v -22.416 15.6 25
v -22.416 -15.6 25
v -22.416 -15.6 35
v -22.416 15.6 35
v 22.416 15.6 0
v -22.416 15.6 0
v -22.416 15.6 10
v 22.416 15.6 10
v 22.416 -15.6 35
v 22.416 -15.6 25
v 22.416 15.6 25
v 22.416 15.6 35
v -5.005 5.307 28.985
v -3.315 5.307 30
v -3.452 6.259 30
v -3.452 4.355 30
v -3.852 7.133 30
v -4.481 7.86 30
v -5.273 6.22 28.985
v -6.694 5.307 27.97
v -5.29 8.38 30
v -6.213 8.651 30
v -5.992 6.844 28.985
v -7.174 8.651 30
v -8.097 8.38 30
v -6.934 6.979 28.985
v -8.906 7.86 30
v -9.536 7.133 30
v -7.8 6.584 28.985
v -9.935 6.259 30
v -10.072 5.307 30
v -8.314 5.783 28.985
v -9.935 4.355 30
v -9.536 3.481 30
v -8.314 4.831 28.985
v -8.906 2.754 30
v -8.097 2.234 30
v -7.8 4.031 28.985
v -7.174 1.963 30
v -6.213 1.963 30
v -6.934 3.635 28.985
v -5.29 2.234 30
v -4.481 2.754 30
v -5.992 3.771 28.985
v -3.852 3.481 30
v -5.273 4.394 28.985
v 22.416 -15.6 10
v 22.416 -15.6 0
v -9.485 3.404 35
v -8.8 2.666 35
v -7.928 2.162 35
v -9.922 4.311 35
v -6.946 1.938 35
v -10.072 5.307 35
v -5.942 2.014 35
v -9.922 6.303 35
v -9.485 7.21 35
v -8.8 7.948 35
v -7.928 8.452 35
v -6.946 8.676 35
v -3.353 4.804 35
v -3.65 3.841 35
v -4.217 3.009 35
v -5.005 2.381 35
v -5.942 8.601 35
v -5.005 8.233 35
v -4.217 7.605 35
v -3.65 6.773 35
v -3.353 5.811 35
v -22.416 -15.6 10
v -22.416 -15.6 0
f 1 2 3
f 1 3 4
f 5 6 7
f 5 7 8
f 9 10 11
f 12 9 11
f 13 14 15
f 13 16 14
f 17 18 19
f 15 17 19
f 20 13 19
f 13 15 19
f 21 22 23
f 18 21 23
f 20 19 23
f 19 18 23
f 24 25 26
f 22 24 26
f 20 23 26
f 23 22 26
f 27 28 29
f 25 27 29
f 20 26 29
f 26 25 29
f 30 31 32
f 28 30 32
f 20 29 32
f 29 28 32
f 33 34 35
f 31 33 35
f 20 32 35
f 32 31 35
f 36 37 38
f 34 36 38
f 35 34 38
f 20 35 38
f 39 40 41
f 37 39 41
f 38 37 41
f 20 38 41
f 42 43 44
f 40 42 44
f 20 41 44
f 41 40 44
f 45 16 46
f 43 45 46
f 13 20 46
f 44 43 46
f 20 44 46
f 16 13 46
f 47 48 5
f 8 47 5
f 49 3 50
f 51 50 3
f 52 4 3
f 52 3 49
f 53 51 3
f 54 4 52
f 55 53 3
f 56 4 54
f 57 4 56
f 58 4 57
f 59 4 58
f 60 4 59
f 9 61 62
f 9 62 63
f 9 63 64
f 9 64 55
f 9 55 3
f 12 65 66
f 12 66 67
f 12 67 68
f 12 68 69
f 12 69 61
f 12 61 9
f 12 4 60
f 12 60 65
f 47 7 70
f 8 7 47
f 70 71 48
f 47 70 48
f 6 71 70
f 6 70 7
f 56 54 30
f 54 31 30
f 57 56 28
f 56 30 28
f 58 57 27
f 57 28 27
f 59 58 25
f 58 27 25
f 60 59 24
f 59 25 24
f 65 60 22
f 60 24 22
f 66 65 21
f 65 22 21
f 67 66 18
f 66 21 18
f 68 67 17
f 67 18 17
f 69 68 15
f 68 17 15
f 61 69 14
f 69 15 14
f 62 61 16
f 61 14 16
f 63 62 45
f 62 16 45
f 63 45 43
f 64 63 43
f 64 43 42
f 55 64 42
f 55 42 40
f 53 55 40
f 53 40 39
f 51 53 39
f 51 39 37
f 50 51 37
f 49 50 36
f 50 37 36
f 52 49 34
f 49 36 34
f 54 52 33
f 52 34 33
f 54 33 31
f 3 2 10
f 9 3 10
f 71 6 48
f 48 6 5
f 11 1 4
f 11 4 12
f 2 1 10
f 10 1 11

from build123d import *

# Parameters (mm, degrees)
F0_W     = 44.8315404356
F0_H     = 31.1993751675
F1_DEPTH = 10
F3_W     = 44.8315404356
F3_H     = 31.1993751675
F4_DEPTH = 10
F6_D     = 6.7564
F6_DEPTH = 5
F6_TIP   = 2.0298273432


with BuildPart() as f1:
    # F0 (on Top) → F1 (new body)
    with BuildSketch(Plane.XY):
        Rectangle(F0_W, F0_H)
    extrude(amount=F1_DEPTH)


with BuildPart() as f4:
    # F3 (on offset) → F4 (new body)
    with BuildSketch(Plane.XY.offset(25)):
        Rectangle(F3_W, F3_H)
    extrude(amount=F4_DEPTH)

    # F6
    with Locations(Plane.XY.offset(35)):
        with Locations((-6.6936477087, 5.3070797585)):
            Hole(F6_D / 2, depth=F6_DEPTH)
            with Locations((0, 0, -(F6_DEPTH + F6_TIP / 2))):  # 118° drill point
                Cone(0, F6_D / 2, F6_TIP, mode=Mode.SUBTRACT)


solid = Compound([f1.part, f4.part])
